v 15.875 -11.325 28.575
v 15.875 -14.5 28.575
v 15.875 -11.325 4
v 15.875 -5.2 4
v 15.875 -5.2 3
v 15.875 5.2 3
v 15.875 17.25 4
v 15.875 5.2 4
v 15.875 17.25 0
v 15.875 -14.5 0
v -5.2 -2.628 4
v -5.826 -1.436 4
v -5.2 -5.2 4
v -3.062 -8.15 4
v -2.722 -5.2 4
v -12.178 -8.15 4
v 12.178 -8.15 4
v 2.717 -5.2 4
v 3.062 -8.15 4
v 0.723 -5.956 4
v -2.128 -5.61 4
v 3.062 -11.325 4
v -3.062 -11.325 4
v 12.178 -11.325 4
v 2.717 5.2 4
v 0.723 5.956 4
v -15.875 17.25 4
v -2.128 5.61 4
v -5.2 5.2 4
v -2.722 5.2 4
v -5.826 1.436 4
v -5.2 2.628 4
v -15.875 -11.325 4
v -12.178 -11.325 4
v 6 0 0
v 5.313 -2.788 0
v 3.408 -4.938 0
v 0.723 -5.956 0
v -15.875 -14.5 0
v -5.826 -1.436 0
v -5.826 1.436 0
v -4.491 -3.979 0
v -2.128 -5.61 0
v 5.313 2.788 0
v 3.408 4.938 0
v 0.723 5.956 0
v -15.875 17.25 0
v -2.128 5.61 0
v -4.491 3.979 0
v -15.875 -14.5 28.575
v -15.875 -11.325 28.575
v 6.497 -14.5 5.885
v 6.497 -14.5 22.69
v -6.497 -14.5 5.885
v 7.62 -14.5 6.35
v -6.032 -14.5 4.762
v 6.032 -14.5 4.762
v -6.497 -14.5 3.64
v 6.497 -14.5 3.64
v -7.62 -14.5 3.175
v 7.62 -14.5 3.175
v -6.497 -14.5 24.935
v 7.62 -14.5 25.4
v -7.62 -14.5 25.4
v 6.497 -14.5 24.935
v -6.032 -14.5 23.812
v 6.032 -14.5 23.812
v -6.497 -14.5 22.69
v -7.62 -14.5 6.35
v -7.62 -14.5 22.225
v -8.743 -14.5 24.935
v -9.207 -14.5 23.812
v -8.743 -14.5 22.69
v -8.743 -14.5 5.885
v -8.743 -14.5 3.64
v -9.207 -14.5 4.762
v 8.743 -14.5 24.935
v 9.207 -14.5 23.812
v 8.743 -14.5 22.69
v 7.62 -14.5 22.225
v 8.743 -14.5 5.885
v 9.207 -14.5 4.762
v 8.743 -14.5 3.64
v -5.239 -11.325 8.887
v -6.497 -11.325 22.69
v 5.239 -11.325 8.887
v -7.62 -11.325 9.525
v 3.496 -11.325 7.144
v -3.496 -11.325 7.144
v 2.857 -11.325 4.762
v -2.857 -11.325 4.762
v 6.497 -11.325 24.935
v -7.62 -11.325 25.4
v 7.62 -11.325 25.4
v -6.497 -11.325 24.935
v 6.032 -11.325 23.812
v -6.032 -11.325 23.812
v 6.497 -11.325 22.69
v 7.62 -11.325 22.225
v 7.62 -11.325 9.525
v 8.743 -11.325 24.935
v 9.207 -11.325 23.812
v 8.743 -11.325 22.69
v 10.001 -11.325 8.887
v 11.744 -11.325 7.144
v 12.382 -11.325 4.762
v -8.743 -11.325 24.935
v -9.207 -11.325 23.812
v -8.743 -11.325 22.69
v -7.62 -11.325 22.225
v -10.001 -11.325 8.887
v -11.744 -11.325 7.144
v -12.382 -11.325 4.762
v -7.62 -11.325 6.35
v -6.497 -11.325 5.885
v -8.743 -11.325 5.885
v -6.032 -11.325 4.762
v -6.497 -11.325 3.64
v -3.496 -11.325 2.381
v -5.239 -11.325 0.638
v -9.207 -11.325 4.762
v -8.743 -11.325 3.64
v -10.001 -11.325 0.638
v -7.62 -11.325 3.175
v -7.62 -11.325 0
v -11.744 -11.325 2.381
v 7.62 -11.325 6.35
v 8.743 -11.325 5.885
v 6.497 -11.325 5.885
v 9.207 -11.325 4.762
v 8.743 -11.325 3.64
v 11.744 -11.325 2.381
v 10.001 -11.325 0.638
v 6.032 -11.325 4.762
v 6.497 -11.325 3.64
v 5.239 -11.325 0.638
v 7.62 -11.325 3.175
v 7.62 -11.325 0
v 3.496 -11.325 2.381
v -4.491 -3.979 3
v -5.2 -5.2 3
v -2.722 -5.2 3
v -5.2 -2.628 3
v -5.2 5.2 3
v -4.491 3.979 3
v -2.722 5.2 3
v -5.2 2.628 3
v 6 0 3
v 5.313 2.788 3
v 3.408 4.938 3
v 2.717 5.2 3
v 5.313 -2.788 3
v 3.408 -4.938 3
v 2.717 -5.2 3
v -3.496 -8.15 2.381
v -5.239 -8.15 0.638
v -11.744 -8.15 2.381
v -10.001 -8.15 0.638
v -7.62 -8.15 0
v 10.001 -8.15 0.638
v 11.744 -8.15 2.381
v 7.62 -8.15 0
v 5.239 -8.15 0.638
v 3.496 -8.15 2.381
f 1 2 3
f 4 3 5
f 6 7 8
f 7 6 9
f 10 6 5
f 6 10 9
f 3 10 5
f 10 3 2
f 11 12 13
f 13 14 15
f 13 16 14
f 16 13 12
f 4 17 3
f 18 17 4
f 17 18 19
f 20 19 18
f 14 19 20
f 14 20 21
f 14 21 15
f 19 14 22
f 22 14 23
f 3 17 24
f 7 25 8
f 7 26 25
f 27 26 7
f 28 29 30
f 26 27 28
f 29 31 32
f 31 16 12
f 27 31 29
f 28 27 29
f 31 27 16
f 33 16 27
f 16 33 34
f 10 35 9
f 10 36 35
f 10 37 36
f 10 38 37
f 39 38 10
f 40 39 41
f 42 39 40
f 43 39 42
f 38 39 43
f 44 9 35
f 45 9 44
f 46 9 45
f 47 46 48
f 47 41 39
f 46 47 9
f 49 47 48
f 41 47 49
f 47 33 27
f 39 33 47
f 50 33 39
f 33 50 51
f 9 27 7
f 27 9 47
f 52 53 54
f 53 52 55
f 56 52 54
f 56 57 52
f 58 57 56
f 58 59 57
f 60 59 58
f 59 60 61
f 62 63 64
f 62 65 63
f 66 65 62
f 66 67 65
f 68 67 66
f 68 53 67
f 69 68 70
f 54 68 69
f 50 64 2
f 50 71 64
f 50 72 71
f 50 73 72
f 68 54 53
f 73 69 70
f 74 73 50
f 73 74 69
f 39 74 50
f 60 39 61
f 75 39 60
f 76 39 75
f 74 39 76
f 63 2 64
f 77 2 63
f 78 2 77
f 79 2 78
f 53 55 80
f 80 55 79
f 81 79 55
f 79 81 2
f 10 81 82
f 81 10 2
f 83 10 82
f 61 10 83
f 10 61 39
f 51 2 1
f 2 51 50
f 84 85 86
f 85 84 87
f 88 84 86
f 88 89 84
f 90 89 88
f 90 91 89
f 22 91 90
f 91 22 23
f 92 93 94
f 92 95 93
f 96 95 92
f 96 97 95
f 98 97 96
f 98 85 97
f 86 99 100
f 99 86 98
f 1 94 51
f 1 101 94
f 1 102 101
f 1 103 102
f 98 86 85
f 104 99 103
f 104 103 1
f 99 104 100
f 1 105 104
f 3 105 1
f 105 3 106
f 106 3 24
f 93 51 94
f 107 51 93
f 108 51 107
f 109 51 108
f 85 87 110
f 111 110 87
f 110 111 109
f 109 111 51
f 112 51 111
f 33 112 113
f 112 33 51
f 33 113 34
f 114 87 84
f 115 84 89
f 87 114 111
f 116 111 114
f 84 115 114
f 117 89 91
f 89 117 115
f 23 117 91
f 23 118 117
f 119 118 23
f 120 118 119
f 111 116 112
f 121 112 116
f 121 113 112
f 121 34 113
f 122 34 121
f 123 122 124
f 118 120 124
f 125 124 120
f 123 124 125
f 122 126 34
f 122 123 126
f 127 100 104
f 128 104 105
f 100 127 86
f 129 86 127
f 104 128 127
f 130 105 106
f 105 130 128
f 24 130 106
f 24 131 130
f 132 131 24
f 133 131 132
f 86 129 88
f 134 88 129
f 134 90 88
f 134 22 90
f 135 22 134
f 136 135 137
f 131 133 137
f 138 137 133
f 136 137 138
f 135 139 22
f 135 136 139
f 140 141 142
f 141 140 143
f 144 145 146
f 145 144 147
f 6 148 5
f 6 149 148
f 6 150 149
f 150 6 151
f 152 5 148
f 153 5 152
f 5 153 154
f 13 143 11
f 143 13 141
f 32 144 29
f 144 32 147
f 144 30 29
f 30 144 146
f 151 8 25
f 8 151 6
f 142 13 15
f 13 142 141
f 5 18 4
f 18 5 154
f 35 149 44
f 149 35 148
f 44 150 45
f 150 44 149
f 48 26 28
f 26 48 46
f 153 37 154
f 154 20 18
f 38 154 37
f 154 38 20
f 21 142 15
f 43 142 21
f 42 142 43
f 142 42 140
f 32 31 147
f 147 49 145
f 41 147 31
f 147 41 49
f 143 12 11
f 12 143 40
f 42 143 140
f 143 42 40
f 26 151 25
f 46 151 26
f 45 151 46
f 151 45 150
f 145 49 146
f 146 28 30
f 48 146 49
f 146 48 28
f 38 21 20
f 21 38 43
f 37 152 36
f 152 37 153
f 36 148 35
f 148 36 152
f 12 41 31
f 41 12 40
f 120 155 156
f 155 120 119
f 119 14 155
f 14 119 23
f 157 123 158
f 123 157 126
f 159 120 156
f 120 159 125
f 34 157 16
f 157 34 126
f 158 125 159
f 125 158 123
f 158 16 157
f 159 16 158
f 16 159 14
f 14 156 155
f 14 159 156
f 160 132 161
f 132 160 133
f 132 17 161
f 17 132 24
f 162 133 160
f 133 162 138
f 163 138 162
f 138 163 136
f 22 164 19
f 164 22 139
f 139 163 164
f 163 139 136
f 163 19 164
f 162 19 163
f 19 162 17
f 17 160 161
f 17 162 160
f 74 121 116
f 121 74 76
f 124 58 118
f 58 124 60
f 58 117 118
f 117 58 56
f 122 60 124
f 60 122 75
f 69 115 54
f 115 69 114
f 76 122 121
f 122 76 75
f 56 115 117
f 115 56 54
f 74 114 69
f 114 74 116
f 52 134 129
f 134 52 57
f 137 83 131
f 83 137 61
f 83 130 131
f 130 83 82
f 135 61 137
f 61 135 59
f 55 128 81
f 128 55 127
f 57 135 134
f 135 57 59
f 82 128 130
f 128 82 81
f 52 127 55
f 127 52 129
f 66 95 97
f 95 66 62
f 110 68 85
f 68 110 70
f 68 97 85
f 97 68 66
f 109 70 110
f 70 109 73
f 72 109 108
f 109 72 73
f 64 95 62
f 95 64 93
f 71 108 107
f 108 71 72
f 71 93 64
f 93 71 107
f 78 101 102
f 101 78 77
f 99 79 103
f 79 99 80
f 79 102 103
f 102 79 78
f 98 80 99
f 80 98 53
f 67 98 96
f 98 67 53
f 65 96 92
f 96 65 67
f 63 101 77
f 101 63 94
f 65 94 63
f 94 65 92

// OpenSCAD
// file: utils.scad
//
// general utility functions for OpenSCAD
//
function inch(in) = 25.4*in;
// main file
// ring mount for components
// Copyright (C) 2016, Theodore C Yapo

use <utils.scad>;


ring_length = 10;
center_height = 14.5;
outer_d = 2*center_height / cos(30);
ring_thickness = 4;
inner_d = outer_d - 2*ring_thickness;
screw_spacing = inch(0.6);
base_width = inch(1.25);
base_thickness = inch(0.125);
base_length = inch(1.125);

nut_block_thickness = 6;
nut_block_width = 12;

// recesses for #4-40 hex nuts
nut_d = inch(0.25) / cos(30) + 0.5;
nut_h = 3;

set_screw_d = inch(0.125);

epsilon = 1;

face_thickness = 4;
aperture_d = 12;
board_guide_depth = 1;
board_tol = 0.25;

module LED_mount(){
  difference(){
    union(){
      // face
      translate([-base_width/2, -center_height, 0]){
        cube([base_width, base_width, face_thickness]);
      }

      // base
      translate([-base_width/2, -center_height, 0]){
        cube([base_width, base_thickness, base_length]);
      }
    }

    // board guide
    translate([-(9.9+0.5)/2, -(9.9+0.5)/2,
               face_thickness - board_guide_depth]){
      cube([34.8+2*0.25, 9.9+2*0.25, 1.6]);
    }


    // required holes for board
    translate([0, 0, -epsilon]){
      cylinder($fn=13, d = aperture_d, h = face_thickness+2*epsilon);
    }


    // mounting screw clearance slots
    translate([-inch(0.6)/2,
               -center_height + base_thickness,
               (base_length - inch(0.75))/2]){
      rotate([-90, 0, 0]){
        cylinder($fn=12, d = inch(0.375), h = inch(0.125));
      }
    }
    translate([+inch(0.6)/2,
               -center_height + base_thickness,
               (base_length - inch(0.75))/2]){
      rotate([-90, 0, 0]){
        cylinder($fn=12, d = inch(0.375), h = inch(0.125));
      }
    }
    
    
    // mounting screw holes
    translate([-inch(0.6)/2,
               -center_height-epsilon,
               (base_length - inch(0.75))/2]){
      rotate([-90, 0, 0]){
        cylinder($fn=8, d = inch(0.125), h = inch(0.25));
      }
    }
    translate([+inch(0.6)/2,
               -center_height-epsilon,
               (base_length - inch(0.75))/2]){
      rotate([-90, 0, 0]){
        cylinder($fn=8, d = inch(0.125), h = inch(0.25));
      }
    }
    translate([-inch(0.6)/2,
               -center_height - epsilon,
               base_length - (base_length - inch(0.75))/2]){
      rotate([-90, 0, 0]){
        cylinder($fn=8, d = inch(0.125), h = inch(0.25));
      }
    }
    translate([+inch(0.6)/2,
               -center_height - epsilon,
               base_length - (base_length - inch(0.75))/2]){
      rotate([-90, 0, 0]){
        cylinder($fn=8, d = inch(0.125), h = inch(0.25));
      }
    }
  }  
}

module HS()
{
  translate([-19/2, -14/2, 1.6]){
    cube([19, 14, 5]);
  }
}
module Saber_Z1()
{
  translate([-9.9/2, -9.9/2, 0]){
    cube([34.8, 9.9, 1.6]);
  }
}

module printing_layout()
{
  // rotate([0, 90, 0]){
    LED_mount();
    // }
}

module LED_mount_assembly()
{
  LED_mount();

  translate([0, 0, face_thickness]){
    Saber_Z1();
    color("red") HS();
  }
}


printing_layout();

//LED_mount_assembly();
